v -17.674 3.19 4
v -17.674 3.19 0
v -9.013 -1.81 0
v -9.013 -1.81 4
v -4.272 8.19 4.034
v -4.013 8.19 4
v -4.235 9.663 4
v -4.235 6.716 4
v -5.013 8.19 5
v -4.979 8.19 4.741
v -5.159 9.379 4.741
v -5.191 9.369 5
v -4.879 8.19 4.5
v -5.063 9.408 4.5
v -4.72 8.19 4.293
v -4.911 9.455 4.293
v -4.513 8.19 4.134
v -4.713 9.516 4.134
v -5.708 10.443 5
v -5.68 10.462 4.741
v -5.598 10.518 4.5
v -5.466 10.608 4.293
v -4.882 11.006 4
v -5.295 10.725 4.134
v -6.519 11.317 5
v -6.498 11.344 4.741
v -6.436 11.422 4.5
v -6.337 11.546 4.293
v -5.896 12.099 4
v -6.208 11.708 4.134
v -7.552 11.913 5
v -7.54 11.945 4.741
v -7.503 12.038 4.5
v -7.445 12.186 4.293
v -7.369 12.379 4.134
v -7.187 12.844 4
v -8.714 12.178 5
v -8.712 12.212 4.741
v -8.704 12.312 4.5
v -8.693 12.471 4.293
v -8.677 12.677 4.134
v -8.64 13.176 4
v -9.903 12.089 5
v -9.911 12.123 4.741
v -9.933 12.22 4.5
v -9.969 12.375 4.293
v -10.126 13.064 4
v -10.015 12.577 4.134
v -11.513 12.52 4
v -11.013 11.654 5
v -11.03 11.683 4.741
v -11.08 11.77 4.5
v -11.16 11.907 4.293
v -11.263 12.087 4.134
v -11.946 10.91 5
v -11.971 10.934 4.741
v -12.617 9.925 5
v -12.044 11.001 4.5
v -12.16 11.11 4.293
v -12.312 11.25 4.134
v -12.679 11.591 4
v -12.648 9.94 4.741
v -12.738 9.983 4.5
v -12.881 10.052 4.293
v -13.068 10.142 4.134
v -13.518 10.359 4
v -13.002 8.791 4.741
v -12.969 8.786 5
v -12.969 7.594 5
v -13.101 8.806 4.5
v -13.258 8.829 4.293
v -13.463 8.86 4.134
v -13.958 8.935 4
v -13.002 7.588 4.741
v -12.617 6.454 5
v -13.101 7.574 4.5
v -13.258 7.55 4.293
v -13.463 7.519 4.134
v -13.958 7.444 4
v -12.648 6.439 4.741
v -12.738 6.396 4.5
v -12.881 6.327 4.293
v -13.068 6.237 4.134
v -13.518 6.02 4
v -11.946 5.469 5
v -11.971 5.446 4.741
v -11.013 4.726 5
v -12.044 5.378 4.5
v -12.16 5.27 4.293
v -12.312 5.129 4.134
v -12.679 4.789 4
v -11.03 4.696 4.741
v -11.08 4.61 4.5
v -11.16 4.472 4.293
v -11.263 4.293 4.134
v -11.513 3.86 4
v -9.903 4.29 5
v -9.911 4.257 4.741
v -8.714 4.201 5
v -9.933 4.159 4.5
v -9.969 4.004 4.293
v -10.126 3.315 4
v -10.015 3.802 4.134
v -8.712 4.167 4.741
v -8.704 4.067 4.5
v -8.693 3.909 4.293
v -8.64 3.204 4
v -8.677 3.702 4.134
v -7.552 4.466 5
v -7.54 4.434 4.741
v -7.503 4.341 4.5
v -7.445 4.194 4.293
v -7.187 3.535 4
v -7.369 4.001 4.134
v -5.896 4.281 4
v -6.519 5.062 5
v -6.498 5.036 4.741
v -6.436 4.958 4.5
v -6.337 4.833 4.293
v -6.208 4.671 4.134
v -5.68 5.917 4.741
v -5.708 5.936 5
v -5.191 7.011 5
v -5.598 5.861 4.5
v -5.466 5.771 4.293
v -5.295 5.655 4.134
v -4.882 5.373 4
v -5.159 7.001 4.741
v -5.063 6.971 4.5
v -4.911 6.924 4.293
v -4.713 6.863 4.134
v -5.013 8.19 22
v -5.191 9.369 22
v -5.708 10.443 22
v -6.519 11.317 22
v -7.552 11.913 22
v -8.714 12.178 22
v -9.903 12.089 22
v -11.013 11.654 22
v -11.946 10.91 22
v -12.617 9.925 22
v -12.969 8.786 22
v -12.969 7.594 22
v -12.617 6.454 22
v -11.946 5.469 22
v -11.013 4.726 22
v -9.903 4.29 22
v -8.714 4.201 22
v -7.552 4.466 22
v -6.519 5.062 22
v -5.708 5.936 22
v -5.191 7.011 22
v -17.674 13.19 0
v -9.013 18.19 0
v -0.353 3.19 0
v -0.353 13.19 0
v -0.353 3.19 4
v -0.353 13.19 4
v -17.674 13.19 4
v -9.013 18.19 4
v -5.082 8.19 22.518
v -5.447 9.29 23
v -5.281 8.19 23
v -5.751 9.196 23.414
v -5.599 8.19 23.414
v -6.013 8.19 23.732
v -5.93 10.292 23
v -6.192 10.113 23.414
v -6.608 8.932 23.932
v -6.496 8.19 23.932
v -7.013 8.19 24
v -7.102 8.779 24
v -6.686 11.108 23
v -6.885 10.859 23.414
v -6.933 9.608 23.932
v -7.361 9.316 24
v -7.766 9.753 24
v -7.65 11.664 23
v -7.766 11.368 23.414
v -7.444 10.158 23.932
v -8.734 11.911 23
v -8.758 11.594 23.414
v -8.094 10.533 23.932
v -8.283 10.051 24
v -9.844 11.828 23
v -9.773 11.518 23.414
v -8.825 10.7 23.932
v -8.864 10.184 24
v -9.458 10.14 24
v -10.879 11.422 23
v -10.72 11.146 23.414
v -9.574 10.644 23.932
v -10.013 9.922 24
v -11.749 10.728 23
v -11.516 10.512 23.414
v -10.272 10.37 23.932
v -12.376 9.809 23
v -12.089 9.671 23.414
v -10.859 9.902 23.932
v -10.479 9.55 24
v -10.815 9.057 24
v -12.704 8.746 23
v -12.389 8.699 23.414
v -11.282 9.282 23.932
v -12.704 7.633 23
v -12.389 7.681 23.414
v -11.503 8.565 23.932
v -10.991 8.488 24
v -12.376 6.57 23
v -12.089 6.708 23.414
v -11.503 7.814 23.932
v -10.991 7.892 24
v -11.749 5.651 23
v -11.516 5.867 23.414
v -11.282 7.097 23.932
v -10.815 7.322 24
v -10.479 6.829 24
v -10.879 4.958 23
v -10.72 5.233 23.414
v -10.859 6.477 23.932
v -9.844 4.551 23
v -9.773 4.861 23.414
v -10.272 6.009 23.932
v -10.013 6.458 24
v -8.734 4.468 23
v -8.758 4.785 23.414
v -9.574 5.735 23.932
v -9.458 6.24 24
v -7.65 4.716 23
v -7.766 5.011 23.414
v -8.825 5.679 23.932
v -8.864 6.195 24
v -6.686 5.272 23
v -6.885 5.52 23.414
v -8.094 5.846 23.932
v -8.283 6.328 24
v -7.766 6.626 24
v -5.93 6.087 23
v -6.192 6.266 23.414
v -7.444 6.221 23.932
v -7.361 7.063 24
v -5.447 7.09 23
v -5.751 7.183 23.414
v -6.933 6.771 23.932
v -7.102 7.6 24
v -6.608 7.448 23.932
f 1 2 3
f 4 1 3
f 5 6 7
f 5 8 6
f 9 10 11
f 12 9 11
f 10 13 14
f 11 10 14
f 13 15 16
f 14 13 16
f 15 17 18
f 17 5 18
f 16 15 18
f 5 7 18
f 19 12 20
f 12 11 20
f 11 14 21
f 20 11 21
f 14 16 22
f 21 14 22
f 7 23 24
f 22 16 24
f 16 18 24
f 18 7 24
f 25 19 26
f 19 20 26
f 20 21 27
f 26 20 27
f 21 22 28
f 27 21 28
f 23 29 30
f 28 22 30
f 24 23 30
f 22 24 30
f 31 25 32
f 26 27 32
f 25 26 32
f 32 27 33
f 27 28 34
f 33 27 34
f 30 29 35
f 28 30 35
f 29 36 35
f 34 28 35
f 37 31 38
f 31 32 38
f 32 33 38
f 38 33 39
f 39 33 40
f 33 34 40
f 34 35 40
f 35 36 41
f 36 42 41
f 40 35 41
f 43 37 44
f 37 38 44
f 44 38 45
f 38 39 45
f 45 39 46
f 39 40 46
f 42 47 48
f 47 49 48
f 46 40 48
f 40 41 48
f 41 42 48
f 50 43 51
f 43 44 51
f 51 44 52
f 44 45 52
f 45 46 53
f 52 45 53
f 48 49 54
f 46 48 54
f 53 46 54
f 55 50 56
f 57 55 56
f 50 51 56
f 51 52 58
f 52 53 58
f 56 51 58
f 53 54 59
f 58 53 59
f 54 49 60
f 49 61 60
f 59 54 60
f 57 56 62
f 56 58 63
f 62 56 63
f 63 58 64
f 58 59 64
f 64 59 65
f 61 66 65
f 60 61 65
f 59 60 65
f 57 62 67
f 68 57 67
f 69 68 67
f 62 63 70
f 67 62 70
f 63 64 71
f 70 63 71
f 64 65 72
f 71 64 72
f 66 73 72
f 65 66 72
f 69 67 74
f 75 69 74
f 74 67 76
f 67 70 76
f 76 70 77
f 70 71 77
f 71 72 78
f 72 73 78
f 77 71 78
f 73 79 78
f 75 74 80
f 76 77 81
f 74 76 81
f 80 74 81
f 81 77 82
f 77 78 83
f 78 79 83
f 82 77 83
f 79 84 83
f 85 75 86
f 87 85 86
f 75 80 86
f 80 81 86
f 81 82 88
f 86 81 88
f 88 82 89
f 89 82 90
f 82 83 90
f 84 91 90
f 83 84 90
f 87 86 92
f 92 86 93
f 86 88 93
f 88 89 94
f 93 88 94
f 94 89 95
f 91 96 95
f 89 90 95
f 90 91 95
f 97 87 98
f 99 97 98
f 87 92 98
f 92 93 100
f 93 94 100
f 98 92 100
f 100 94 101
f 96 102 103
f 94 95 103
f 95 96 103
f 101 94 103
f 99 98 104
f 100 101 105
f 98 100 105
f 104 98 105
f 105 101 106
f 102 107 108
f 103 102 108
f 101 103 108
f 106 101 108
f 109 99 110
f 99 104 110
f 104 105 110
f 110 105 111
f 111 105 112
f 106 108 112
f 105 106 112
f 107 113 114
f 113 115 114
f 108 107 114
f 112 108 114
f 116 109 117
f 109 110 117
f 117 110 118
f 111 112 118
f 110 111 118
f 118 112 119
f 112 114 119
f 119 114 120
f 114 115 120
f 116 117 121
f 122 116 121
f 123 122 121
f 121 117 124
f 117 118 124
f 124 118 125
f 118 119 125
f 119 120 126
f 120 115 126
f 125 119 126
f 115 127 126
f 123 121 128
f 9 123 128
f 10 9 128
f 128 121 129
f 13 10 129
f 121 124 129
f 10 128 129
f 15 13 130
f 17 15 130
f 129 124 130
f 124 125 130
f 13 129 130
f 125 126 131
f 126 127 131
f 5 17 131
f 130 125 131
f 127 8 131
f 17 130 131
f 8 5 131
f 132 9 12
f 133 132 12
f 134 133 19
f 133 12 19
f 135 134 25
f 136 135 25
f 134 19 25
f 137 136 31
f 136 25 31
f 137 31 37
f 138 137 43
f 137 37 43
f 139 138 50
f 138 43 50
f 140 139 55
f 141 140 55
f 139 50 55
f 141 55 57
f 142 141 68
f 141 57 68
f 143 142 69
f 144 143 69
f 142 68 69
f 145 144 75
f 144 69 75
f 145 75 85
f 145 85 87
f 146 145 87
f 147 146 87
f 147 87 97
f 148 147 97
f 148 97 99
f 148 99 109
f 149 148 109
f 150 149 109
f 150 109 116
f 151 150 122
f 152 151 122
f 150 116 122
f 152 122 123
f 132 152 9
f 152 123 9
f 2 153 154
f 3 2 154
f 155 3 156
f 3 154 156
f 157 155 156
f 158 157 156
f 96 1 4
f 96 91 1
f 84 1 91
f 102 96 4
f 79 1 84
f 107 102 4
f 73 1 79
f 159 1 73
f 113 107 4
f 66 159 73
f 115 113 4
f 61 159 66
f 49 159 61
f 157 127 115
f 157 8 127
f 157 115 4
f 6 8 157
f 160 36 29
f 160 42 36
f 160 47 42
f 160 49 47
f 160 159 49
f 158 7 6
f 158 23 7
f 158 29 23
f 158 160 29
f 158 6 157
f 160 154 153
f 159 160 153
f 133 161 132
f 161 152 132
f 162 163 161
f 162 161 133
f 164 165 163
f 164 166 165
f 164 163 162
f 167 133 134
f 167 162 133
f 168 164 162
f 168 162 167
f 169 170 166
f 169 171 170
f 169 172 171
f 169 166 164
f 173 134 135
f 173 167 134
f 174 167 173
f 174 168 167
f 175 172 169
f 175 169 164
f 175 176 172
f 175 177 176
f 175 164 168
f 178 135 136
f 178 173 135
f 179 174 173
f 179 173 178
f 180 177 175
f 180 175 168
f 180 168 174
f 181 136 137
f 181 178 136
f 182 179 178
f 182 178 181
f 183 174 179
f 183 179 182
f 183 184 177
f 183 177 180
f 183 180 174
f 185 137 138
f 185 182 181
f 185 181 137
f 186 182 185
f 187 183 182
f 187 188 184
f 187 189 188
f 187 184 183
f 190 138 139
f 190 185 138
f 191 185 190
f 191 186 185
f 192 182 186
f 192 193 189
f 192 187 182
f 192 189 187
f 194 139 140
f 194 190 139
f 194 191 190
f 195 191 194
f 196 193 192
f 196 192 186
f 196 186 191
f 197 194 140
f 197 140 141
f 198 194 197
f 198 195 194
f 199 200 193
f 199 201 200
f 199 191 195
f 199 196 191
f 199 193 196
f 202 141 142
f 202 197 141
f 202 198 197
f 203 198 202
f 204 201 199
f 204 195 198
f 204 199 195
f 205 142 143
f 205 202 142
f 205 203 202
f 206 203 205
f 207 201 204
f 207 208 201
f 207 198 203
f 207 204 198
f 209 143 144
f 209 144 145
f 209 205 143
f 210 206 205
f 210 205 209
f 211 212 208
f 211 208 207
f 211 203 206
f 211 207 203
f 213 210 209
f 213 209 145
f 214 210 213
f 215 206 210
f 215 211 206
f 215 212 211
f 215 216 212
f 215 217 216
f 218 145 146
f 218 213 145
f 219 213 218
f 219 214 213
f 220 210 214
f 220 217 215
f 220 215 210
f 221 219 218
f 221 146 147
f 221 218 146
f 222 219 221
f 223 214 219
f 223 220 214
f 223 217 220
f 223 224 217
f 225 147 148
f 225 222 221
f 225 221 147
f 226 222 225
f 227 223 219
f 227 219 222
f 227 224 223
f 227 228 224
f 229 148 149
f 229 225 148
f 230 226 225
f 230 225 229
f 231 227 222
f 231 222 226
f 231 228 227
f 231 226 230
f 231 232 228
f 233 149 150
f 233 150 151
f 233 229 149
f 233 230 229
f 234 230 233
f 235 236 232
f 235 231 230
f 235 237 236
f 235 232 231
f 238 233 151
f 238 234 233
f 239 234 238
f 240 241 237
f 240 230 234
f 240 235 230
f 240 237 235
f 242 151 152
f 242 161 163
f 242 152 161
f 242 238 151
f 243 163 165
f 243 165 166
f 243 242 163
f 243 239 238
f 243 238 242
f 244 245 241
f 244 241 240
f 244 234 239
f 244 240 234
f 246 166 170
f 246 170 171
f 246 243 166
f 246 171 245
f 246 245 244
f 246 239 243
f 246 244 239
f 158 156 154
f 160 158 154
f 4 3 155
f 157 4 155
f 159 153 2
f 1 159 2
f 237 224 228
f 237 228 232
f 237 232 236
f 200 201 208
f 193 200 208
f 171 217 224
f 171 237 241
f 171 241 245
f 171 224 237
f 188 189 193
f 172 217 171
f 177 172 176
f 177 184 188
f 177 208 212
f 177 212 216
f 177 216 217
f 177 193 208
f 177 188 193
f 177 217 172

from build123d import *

# Parameters (mm, degrees)
BOSS_EXTRUDE2_DEPTH = 4
SKETCH4_R           = 4
BOSS_EXTRUDE3_DEPTH = 20
FILLET1_R           = 2
FILLET3_R           = 1


with BuildPart() as part:
    # Sketch1 → Boss-Extrude2 (new body)
    with BuildSketch(Plane.XY):
        Polygon((-0.353108988, 3.18967376), (-0.353108988, 13.18967376), (-9.013363026, 18.18967376), (-17.673617064, 13.18967376), (-17.673617064, 3.18967376), (-9.013363026, -1.81032624), align=None)
    extrude(amount=BOSS_EXTRUDE2_DEPTH)

    # Sketch4 → Boss-Extrude3 (add)
    with BuildSketch(Plane.XY.offset(4)):
        with Locations((-9.013363026, 8.18967376)):
            Circle(SKETCH4_R)
    extrude(amount=BOSS_EXTRUDE3_DEPTH)

    # Fillet1
    fillet1_edges = [part.edges().sort_by_distance(p)[0] for p in [
        (-13.013363026, 8.18967376, 24),
    ]]
    fillet(fillet1_edges, radius=FILLET1_R)

    # Fillet3
    fillet3_edges = [part.edges().sort_by_distance(p)[0] for p in [
        (-13.013363026, 8.18967376, 4),
    ]]
    fillet(fillet3_edges, radius=FILLET3_R)


solid = part.part
